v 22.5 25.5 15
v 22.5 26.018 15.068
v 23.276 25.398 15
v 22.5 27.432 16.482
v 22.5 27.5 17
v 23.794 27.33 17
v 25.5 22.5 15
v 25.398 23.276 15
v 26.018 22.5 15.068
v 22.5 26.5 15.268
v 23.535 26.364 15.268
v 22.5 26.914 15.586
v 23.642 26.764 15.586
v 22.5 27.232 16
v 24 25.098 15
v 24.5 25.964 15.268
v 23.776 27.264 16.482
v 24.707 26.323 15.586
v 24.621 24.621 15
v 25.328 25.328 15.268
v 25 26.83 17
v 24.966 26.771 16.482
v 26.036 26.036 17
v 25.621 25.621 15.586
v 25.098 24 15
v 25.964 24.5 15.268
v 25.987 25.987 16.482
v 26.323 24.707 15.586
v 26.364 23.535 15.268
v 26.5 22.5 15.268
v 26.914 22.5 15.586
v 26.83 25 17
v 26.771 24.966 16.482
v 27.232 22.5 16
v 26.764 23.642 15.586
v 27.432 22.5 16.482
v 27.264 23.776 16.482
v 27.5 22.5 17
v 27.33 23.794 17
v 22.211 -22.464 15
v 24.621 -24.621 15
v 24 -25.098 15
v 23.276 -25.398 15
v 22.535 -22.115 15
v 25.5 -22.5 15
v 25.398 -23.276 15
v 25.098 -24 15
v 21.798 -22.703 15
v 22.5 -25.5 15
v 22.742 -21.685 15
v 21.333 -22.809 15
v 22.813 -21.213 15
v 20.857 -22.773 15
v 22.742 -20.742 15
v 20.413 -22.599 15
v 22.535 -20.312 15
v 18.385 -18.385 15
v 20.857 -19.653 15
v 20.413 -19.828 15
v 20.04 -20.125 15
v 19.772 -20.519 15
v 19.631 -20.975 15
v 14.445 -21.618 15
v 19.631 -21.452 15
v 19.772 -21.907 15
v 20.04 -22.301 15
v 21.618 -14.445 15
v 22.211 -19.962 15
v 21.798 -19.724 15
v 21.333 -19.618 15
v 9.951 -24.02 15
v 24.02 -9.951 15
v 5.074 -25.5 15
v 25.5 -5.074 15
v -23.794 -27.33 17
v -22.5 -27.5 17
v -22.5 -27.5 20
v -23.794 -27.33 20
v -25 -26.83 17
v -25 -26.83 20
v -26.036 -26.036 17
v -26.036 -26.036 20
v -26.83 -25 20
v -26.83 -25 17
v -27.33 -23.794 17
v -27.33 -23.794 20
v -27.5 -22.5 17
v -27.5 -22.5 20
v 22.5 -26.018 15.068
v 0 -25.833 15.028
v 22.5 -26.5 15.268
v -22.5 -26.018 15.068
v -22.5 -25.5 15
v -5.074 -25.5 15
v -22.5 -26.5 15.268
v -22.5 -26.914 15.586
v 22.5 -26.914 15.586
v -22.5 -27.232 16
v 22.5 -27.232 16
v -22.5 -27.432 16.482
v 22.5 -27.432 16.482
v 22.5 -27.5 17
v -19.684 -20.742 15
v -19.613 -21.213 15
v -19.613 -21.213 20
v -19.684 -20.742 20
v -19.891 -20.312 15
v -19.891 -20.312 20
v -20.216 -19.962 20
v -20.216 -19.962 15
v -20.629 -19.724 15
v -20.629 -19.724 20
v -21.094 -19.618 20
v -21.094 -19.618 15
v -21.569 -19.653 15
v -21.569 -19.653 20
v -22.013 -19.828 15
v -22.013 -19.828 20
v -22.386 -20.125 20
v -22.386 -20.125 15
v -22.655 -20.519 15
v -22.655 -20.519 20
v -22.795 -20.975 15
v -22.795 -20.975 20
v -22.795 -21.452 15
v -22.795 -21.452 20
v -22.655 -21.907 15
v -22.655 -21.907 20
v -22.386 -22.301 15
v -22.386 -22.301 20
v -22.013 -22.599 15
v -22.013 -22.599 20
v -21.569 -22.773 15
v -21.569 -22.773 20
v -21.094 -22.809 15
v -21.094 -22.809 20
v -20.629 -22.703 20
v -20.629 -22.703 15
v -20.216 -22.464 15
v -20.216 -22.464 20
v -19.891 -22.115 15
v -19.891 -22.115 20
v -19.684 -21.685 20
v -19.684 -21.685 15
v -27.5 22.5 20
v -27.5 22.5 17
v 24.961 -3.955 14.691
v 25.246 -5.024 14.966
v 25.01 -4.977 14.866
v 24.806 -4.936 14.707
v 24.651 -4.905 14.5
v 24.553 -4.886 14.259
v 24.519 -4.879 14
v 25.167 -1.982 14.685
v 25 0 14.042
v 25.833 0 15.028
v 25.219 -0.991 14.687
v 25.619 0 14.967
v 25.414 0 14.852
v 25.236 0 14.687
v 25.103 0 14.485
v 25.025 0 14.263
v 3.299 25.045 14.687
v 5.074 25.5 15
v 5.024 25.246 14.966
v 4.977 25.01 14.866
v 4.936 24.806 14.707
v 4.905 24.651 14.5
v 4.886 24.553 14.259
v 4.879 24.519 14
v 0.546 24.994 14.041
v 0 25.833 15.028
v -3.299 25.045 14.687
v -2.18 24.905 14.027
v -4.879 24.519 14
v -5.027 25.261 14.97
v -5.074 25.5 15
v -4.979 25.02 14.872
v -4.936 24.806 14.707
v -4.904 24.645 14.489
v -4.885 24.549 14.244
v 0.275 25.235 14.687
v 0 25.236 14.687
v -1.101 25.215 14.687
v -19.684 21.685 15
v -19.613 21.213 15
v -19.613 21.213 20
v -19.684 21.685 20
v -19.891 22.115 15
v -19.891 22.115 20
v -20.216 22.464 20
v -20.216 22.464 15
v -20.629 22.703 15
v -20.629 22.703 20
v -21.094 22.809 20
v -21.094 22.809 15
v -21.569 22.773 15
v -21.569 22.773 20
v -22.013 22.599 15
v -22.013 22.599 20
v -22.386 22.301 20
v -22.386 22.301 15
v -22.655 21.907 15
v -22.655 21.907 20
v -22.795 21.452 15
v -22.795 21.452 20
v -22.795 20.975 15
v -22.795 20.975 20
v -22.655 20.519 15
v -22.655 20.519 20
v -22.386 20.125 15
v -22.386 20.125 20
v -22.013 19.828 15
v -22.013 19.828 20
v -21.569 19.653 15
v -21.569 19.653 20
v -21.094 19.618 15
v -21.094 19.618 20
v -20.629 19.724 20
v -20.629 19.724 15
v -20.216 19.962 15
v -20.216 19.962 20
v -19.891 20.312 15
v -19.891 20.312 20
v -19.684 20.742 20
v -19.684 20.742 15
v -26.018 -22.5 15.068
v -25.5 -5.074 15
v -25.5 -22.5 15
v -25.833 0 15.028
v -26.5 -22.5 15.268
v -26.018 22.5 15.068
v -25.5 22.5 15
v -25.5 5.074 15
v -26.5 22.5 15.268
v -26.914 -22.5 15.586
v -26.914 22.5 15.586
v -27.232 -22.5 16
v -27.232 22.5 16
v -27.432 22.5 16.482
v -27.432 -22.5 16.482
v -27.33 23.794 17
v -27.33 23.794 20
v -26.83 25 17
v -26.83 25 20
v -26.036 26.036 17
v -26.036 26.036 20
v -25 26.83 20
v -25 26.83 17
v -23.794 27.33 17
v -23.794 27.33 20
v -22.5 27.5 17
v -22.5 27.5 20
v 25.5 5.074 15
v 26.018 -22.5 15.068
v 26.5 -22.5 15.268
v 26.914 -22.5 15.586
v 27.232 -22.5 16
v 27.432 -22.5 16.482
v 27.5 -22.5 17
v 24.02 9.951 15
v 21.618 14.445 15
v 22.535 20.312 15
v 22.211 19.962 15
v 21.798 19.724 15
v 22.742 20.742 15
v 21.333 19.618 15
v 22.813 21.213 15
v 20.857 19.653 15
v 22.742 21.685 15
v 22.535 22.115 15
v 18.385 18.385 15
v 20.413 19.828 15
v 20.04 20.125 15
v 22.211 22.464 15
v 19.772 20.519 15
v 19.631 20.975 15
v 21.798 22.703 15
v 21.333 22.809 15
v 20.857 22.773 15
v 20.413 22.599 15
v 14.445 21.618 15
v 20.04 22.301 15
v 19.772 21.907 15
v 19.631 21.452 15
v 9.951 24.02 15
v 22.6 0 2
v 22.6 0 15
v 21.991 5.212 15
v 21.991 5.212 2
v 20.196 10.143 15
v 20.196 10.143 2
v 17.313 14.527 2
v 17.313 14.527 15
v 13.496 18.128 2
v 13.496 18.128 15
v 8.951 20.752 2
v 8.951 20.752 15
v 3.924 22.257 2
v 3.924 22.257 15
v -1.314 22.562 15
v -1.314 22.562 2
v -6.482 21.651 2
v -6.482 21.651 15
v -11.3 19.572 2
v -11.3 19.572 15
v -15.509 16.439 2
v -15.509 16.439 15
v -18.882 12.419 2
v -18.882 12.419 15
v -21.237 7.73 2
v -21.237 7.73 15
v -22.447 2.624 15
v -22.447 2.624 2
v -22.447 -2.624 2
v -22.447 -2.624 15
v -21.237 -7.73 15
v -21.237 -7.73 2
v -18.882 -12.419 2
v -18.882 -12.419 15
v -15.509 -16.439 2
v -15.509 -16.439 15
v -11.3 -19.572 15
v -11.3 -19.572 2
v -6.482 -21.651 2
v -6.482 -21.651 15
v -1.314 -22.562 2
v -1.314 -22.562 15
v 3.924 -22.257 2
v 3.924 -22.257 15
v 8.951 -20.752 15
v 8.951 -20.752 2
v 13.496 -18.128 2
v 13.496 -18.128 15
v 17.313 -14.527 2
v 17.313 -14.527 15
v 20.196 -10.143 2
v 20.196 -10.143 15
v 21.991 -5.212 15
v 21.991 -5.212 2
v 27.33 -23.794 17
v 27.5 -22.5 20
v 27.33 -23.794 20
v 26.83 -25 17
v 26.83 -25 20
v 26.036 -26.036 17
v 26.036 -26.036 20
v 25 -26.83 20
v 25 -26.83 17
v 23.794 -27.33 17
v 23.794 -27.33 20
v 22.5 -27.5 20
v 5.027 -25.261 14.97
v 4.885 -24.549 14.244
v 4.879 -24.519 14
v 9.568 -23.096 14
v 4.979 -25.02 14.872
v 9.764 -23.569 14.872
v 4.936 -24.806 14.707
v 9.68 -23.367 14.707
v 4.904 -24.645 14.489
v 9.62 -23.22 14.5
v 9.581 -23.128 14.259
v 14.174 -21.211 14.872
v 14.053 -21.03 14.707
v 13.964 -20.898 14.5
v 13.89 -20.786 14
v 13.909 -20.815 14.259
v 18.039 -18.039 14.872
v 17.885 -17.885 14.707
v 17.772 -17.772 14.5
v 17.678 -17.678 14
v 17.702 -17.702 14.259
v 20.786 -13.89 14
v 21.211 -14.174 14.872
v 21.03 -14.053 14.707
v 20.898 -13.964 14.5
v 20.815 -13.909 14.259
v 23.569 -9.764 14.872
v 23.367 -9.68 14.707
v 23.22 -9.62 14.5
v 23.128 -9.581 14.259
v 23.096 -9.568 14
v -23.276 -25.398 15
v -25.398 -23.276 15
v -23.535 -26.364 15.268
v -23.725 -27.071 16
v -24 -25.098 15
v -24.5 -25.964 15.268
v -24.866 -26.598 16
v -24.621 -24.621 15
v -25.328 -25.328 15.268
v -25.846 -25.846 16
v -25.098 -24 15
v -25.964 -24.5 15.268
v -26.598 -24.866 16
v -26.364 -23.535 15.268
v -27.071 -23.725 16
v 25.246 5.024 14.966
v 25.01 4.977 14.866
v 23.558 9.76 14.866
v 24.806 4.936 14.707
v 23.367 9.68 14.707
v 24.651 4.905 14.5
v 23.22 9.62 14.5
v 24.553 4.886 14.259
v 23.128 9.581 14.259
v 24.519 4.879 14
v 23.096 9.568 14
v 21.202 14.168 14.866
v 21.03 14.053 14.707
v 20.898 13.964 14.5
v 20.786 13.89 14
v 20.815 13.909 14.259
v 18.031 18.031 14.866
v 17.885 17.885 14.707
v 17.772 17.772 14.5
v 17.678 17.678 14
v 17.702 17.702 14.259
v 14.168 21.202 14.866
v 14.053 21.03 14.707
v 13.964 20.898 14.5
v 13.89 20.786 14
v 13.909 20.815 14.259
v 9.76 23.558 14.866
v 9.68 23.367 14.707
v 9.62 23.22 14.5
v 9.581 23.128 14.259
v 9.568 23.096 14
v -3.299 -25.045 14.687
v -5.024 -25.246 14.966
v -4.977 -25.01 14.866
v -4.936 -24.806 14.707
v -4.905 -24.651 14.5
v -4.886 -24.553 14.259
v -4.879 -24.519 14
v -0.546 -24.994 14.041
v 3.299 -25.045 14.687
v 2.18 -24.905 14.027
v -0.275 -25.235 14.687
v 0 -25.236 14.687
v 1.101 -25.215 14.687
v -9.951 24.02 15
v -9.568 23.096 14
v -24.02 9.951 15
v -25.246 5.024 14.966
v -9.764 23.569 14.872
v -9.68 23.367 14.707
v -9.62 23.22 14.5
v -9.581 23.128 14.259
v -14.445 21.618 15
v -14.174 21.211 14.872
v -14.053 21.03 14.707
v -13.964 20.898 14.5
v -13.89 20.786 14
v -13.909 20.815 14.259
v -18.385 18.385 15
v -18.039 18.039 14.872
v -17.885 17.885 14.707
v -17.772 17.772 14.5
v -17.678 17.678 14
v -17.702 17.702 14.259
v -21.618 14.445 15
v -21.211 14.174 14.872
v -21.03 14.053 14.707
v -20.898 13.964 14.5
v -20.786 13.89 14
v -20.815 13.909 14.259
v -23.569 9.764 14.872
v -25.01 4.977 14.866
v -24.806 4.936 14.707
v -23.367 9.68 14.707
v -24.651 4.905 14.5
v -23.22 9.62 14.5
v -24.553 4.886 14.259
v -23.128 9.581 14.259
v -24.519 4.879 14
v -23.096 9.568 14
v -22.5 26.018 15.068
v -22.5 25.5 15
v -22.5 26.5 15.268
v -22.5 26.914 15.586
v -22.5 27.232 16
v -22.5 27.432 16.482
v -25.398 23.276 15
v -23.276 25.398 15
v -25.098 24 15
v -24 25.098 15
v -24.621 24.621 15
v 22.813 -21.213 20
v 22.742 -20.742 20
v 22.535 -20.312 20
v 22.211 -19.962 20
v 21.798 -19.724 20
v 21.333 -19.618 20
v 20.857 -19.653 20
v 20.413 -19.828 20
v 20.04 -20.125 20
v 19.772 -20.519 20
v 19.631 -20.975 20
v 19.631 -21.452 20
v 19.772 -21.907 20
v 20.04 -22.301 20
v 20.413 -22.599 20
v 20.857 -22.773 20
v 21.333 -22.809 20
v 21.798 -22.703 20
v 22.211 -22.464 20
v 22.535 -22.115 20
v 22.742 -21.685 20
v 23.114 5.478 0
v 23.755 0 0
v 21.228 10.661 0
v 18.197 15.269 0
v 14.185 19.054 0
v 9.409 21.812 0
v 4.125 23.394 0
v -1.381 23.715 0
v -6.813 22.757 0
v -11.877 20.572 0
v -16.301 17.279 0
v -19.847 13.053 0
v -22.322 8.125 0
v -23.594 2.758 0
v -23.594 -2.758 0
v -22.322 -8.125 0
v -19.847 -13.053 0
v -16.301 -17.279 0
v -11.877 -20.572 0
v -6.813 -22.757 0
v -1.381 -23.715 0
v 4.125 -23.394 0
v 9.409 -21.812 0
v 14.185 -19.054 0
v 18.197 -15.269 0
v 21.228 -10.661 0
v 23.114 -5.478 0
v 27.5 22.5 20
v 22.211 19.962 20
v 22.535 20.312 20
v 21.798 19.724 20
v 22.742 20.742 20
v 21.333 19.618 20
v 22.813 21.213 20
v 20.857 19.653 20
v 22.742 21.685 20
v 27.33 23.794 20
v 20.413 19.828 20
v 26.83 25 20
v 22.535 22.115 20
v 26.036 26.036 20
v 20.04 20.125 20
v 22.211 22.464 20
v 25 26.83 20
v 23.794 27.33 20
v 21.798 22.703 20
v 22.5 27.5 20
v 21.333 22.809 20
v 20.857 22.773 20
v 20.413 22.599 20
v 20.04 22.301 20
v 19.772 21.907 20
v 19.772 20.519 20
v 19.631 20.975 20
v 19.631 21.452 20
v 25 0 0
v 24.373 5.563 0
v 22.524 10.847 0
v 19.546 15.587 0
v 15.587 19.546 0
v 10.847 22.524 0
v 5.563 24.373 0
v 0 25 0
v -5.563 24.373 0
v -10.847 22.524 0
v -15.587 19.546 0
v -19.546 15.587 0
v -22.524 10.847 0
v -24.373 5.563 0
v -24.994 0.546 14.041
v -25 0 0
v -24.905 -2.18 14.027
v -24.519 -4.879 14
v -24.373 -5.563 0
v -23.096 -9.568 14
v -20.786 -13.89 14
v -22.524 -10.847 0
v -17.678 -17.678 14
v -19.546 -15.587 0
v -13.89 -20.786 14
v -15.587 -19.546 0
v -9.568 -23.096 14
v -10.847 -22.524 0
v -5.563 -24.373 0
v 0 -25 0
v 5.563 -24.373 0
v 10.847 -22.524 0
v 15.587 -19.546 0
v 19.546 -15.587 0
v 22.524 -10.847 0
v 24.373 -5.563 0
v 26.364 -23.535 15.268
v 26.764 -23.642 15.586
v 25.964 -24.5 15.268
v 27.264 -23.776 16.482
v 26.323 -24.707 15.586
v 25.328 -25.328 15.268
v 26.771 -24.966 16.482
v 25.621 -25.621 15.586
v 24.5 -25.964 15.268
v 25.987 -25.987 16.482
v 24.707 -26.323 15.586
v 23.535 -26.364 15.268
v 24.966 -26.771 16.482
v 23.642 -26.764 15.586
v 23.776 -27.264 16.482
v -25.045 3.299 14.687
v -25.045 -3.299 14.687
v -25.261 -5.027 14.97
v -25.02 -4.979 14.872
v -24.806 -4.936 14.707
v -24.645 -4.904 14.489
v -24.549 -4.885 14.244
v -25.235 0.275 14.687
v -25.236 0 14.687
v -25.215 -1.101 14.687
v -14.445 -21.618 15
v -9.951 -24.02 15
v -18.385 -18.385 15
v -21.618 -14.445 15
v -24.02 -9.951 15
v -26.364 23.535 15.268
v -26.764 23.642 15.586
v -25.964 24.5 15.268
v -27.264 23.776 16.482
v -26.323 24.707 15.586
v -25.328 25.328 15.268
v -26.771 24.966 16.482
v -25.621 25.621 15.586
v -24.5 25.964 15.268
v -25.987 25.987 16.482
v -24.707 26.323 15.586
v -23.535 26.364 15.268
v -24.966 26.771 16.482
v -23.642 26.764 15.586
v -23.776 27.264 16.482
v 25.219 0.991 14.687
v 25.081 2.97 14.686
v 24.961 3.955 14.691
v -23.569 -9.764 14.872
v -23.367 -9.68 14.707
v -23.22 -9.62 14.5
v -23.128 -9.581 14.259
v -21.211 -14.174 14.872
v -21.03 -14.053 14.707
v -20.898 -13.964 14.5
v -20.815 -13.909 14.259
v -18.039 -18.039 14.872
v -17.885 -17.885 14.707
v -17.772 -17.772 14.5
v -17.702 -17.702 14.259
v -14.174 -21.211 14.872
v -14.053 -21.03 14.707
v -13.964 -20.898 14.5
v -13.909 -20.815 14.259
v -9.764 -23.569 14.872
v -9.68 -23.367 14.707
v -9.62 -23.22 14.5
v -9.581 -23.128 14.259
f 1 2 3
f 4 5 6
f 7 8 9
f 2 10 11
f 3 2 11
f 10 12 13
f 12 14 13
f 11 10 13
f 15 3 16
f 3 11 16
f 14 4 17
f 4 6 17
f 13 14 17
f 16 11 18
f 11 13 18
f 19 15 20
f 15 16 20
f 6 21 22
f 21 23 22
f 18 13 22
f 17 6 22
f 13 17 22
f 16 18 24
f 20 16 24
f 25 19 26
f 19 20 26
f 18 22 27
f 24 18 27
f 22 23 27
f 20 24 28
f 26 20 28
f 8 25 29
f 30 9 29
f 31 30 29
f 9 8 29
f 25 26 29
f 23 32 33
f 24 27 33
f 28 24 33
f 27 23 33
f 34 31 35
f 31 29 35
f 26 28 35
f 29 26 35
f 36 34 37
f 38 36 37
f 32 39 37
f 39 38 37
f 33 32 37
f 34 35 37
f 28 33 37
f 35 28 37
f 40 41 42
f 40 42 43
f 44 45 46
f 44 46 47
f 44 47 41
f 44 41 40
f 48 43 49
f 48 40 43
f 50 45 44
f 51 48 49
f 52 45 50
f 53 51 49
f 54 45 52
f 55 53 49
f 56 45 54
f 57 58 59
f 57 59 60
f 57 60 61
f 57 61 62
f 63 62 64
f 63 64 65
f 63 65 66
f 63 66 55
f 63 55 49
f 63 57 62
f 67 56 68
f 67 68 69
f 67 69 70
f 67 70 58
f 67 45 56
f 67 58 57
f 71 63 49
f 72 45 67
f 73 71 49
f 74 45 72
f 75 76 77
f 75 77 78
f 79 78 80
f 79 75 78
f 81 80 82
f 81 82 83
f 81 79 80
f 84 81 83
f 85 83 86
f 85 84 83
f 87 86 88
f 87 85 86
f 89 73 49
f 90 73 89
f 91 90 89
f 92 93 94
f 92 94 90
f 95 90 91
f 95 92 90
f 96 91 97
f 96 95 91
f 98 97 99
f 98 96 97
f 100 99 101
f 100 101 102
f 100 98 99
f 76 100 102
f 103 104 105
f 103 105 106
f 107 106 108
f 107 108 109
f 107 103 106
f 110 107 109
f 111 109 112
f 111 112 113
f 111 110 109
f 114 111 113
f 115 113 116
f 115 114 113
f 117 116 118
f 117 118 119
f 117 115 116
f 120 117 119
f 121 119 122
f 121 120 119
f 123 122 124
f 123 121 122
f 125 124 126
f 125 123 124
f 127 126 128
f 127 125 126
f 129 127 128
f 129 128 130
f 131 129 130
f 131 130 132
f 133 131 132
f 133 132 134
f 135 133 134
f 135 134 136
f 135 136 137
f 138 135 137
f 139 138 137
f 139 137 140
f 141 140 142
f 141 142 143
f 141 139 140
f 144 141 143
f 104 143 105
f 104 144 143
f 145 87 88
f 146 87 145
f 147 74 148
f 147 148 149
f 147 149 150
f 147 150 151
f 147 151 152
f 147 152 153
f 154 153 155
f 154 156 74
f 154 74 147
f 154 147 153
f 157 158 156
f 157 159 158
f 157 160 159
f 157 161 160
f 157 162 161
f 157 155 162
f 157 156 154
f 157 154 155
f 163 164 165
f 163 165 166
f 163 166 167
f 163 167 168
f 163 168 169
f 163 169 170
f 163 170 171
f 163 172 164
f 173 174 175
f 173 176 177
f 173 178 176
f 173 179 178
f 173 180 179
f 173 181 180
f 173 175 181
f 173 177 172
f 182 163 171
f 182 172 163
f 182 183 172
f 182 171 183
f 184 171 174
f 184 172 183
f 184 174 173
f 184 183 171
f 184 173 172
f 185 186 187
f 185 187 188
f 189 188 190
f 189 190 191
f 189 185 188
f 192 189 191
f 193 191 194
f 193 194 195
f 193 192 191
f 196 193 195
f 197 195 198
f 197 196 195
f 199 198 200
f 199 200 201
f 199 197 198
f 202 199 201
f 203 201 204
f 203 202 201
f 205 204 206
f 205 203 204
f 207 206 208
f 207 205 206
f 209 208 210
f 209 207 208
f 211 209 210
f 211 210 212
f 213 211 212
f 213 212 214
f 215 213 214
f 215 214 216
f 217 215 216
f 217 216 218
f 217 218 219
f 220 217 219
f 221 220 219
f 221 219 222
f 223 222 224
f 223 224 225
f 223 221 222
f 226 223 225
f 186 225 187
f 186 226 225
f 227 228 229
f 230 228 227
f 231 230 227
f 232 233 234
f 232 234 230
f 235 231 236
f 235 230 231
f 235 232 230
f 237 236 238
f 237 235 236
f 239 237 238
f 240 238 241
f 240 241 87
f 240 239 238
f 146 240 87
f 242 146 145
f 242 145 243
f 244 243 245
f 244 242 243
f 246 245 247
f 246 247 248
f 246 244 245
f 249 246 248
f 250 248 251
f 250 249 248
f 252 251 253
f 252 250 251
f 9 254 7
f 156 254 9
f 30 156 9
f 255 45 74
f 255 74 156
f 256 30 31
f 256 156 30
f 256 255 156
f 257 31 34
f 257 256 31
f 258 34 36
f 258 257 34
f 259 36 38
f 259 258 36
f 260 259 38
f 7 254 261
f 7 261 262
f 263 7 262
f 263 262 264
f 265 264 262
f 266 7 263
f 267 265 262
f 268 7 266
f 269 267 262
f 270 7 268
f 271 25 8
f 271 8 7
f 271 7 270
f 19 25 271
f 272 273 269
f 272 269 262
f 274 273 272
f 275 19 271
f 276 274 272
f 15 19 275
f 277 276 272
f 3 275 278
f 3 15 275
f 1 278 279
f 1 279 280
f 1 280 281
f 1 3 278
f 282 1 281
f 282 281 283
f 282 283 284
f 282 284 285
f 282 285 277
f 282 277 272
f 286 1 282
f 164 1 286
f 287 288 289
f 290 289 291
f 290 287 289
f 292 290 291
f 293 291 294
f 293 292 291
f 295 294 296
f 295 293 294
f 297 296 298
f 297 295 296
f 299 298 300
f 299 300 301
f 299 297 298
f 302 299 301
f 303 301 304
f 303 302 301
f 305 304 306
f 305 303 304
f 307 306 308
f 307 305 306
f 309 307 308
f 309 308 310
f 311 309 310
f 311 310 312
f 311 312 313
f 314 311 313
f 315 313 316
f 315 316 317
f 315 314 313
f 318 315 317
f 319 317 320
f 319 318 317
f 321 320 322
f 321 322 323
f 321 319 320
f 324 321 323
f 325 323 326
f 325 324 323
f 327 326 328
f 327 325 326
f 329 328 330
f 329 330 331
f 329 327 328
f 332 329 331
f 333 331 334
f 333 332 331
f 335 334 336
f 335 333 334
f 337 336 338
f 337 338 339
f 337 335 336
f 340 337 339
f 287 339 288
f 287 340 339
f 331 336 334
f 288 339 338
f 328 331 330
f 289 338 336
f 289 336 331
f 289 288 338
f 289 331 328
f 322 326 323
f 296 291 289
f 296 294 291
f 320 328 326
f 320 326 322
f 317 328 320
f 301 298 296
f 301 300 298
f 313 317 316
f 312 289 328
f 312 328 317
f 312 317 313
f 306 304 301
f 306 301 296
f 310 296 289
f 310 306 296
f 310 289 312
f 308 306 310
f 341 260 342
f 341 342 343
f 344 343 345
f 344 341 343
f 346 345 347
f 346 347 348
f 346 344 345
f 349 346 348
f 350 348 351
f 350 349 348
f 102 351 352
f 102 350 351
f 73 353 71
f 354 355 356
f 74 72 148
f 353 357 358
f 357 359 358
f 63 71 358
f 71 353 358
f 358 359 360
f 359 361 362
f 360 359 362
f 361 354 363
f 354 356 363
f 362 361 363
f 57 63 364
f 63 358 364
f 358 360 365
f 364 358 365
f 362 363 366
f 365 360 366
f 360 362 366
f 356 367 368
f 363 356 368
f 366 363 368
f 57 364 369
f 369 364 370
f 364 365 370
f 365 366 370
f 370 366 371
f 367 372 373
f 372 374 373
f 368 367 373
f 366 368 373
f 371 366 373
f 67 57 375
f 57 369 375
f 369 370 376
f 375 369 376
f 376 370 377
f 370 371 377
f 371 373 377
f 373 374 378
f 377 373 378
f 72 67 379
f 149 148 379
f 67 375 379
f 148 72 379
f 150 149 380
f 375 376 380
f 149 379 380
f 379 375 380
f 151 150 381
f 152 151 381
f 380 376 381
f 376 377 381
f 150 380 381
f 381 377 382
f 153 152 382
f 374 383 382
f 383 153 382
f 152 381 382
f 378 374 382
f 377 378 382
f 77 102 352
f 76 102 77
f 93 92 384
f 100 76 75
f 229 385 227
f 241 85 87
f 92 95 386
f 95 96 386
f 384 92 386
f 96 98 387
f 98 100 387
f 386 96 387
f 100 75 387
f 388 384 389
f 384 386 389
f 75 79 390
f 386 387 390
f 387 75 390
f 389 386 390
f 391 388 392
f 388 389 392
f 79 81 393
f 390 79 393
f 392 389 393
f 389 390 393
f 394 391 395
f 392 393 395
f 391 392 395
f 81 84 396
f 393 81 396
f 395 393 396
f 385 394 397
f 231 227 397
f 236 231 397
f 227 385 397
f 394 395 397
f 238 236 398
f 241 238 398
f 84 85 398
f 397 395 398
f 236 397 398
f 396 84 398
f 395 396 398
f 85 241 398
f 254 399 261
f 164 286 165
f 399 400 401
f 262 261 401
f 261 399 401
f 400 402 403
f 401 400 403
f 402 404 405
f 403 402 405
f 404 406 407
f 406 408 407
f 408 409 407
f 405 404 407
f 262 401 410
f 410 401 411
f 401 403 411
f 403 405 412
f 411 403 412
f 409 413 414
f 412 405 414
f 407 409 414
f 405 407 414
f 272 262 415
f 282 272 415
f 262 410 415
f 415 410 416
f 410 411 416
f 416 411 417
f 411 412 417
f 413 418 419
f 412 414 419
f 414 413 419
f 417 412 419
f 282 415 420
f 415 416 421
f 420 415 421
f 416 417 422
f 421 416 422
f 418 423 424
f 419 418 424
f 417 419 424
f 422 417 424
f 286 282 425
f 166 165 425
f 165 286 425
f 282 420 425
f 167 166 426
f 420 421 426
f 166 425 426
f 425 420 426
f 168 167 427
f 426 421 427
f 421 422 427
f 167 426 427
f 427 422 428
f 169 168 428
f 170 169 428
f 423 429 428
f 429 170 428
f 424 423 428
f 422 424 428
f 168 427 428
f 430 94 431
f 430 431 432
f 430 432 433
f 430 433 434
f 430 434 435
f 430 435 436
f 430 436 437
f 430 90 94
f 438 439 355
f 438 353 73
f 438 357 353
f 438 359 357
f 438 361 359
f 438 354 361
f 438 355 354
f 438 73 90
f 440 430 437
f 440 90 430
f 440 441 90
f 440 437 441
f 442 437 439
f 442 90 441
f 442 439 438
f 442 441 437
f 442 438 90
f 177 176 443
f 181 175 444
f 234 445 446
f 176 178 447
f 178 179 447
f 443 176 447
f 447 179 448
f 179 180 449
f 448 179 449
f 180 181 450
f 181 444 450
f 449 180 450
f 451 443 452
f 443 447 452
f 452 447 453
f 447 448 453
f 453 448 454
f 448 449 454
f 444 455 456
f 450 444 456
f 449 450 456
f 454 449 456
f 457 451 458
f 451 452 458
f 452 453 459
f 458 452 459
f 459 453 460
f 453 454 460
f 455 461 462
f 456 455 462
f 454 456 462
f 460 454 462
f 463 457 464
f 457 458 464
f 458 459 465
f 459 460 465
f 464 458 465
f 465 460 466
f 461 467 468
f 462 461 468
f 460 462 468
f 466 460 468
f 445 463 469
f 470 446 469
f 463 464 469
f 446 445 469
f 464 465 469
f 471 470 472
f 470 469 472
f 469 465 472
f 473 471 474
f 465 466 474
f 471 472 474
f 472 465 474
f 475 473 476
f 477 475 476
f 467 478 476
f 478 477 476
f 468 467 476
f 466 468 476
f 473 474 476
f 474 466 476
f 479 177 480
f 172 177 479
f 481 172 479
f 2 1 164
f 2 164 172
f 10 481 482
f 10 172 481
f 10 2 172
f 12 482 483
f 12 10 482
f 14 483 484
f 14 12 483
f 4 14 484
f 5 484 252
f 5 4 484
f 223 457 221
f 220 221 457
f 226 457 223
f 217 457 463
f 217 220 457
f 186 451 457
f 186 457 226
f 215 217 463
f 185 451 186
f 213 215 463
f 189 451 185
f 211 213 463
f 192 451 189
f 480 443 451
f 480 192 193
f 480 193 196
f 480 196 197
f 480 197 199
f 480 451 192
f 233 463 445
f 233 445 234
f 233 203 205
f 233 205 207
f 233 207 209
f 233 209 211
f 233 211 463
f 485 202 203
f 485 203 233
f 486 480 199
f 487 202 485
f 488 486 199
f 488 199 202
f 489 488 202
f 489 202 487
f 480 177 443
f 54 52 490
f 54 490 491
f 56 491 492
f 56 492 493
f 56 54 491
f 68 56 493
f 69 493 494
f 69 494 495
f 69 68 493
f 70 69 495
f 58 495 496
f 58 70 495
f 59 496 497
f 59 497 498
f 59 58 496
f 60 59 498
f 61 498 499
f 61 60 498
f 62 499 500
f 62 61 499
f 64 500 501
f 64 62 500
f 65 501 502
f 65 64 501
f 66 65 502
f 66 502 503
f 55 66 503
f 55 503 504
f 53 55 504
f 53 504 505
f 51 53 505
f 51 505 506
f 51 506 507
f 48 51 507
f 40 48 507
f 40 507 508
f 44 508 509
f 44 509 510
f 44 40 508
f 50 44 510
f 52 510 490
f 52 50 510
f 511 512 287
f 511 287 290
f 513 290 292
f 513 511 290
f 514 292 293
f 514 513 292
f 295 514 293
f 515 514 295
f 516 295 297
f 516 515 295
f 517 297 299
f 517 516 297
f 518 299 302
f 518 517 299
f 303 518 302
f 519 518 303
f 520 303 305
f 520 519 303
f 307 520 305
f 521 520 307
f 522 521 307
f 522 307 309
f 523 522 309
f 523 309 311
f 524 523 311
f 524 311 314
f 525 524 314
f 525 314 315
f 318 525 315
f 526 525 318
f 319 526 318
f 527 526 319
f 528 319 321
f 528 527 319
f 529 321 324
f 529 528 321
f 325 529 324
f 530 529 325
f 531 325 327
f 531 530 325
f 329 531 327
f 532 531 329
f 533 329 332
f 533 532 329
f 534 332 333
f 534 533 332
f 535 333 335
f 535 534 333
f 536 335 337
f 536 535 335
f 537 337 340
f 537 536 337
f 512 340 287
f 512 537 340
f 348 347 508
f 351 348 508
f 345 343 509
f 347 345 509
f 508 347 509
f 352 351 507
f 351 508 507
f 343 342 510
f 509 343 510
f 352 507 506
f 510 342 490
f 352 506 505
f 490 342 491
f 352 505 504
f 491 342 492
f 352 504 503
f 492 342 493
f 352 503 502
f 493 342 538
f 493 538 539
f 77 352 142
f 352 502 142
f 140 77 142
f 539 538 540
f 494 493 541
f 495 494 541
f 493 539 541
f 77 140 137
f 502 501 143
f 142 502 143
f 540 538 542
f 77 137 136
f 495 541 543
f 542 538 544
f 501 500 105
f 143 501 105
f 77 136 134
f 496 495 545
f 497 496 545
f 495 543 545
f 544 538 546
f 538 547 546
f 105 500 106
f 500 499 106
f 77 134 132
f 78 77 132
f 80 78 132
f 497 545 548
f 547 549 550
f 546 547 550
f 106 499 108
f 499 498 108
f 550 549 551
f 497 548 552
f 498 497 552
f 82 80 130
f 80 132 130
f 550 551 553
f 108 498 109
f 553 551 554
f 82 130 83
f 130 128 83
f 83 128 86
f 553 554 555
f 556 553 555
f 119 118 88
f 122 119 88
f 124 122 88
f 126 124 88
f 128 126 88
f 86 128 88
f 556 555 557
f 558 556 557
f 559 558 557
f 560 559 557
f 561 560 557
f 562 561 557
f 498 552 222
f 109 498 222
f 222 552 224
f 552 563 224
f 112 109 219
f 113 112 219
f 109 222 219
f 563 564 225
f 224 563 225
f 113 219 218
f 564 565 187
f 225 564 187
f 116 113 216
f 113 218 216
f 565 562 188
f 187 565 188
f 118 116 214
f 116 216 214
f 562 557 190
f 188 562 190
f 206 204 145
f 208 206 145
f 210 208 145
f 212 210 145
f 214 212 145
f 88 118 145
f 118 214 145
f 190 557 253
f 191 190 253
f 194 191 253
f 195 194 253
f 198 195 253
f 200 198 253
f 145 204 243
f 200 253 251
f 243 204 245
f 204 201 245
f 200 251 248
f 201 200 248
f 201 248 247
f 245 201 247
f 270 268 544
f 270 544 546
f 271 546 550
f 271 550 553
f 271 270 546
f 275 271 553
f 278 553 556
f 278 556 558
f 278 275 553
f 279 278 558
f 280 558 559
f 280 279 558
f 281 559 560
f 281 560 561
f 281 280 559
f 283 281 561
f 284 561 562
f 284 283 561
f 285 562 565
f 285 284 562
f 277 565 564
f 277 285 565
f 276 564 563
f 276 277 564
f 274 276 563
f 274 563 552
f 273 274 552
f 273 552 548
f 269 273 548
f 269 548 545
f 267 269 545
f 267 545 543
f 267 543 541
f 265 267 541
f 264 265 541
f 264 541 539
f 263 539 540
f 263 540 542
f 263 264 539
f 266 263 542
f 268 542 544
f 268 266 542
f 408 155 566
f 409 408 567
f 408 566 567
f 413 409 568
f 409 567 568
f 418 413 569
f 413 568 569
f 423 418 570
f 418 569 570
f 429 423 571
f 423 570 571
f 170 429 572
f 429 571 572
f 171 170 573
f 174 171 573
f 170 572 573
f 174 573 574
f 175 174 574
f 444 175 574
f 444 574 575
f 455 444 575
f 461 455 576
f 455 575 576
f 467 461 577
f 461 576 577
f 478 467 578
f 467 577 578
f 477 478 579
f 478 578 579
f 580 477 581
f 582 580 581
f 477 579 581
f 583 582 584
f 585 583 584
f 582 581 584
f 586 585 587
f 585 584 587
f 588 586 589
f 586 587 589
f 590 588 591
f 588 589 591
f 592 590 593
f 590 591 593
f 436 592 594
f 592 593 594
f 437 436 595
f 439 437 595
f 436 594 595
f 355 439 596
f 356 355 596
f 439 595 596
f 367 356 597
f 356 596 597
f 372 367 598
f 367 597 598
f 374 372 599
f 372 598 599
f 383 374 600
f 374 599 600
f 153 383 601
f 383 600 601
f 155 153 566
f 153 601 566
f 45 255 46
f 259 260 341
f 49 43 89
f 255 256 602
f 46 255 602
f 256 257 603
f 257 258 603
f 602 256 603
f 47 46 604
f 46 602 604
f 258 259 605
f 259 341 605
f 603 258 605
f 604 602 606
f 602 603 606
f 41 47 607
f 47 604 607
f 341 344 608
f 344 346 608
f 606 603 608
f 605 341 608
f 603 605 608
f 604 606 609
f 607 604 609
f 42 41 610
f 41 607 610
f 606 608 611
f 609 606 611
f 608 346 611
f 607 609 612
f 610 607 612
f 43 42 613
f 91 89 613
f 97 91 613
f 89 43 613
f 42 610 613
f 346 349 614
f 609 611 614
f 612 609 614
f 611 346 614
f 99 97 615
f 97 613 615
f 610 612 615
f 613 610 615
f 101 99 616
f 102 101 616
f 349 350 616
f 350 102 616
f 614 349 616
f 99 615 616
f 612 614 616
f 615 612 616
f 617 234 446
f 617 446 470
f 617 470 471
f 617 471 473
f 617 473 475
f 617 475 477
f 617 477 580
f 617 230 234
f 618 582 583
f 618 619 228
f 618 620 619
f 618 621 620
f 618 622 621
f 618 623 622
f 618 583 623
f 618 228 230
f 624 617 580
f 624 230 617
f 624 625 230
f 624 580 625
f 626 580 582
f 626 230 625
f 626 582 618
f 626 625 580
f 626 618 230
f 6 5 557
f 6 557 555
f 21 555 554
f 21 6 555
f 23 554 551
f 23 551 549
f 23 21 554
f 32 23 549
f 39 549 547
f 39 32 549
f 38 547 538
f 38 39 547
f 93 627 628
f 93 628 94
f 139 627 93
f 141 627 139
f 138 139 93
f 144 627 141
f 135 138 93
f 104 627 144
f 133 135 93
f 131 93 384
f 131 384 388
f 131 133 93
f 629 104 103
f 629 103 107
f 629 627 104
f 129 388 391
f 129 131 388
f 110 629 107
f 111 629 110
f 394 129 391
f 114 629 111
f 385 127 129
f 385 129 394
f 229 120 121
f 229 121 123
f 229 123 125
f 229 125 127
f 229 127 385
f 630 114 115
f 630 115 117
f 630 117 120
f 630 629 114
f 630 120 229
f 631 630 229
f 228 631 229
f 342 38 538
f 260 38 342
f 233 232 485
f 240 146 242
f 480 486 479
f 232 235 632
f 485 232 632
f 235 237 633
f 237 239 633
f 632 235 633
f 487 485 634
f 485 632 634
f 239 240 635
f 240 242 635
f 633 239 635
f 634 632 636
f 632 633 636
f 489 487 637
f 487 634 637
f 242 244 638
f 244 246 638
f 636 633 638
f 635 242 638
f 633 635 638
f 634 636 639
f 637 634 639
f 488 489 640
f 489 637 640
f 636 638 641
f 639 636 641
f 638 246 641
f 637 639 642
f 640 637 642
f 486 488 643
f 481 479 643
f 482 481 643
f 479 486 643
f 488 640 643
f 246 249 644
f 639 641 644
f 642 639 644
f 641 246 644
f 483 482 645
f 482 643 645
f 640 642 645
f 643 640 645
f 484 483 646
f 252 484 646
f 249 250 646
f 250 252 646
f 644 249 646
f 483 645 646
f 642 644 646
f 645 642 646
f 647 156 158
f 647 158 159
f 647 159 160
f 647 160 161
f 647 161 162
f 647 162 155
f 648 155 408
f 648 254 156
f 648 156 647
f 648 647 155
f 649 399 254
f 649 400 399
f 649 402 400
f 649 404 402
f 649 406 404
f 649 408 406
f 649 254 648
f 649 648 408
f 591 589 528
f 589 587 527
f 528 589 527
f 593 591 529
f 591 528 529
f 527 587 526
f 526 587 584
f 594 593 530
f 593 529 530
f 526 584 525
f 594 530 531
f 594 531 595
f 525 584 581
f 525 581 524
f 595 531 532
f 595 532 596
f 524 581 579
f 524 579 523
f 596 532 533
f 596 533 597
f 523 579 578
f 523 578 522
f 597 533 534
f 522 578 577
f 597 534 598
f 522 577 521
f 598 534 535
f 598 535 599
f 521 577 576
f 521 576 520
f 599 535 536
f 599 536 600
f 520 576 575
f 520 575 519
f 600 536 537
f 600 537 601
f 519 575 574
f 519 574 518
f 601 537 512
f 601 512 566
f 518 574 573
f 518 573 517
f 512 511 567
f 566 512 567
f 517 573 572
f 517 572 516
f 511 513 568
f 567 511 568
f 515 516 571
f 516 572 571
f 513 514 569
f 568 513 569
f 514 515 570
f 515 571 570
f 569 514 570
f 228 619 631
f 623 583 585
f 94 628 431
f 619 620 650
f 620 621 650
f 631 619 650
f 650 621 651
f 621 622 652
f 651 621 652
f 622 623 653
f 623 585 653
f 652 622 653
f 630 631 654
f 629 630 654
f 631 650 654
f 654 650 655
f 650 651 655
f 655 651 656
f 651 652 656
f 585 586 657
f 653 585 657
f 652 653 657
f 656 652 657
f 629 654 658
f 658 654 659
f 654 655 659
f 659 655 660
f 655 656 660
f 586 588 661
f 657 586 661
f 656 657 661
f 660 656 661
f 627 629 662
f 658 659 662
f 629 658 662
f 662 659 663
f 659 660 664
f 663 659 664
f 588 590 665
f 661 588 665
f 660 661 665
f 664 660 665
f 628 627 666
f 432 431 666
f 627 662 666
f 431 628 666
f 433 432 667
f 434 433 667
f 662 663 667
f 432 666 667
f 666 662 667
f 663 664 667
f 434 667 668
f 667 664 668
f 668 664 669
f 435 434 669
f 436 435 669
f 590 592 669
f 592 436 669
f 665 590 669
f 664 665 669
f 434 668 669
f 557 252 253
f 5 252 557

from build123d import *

# Parameters (mm, degrees)
SZKIC1_R                    = 25
SZKIC1_R_2                  = 22.6
DODANIE_WYCI_GNI_CIE1_DEPTH = 15
SZKIC2_R                    = 1.6
DODANIE_WYCI_GNI_CIE2_DEPTH = 5
ZAOKR_GLENIE3_R             = 2
ZAOKR_GLENIE4_R             = 1
SFAZOWANIE1_SIZE            = 2
SFAZOWANIE1_SIZE2           = 1.154700538


with BuildPart() as part:
    # Szkic1 → Dodanie-wyciągnięcie1 (new body)
    with BuildSketch(Plane.XY):
        Circle(SZKIC1_R)
        Circle(SZKIC1_R_2, mode=Mode.SUBTRACT)
    extrude(amount=DODANIE_WYCI_GNI_CIE1_DEPTH)

    # Szkic2 → Dodanie-wyciągnięcie2 (add)
    with BuildSketch(Plane.XY.offset(15)):
        with BuildLine():
            Line((-22.5, 27.5), (22.5, 27.5))
            ThreePointArc((22.5, 27.5), (26.035533906, 26.035533906), (27.5, 22.5))
            Line((27.5, 22.5), (27.5, -22.5))
            ThreePointArc((27.5, -22.5), (26.035533906, -26.035533906), (22.5, -27.5))
            Line((22.5, -27.5), (-22.5, -27.5))
            ThreePointArc((-22.5, -27.5), (-26.035533906, -26.035533906), (-27.5, -22.5))
            Line((-27.5, -22.5), (-27.5, 22.5))
            ThreePointArc((-27.5, 22.5), (-26.035533906, 26.035533906), (-22.5, 27.5))
        make_face()
        with Locations((-21.213203436, 21.213203436)):
            Circle(SZKIC2_R, mode=Mode.SUBTRACT)
        with Locations((21.213203436, 21.213203436)):
            Circle(SZKIC2_R, mode=Mode.SUBTRACT)
        with Locations((21.213203436, -21.213203436)):
            Circle(SZKIC2_R, mode=Mode.SUBTRACT)
        with Locations((-21.213203436, -21.213203436)):
            Circle(SZKIC2_R, mode=Mode.SUBTRACT)
    extrude(amount=DODANIE_WYCI_GNI_CIE2_DEPTH)

    # Zaokrąglenie3
    zaokr_glenie3_edges = [part.edges().sort_by_distance(p)[0] for p in [
        (-26.035533906, -26.035533906, 15),
        (0, -27.5, 15),
        (26.035533906, -26.035533906, 15),
        (27.5, 0, 15),
        (26.035533906, 26.035533906, 15),
        (0, 27.5, 15),
        (-26.035533906, 26.035533906, 15),
        (-27.5, 0, 15),
    ]]
    fillet(zaokr_glenie3_edges, radius=ZAOKR_GLENIE3_R)

    # Zaokrąglenie4
    zaokr_glenie4_edges = [part.edges().sort_by_distance(p)[0] for p in [
        (-25, 0, 15),
    ]]
    fillet(zaokr_glenie4_edges, radius=ZAOKR_GLENIE4_R)

    # Sfazowanie1
    sfazowanie1_edges = [part.edges().sort_by_distance(p)[0] for p in [
        (-22.6, 0, 0),
    ]]
    sfazowanie1_side = [part.faces().sort_by_distance(p)[0] for p in [
        (-22.6, 0, 7.5),
    ]]
    chamfer(sfazowanie1_edges, length=SFAZOWANIE1_SIZE, length2=SFAZOWANIE1_SIZE2, reference=sfazowanie1_side[0])


solid = part.part
